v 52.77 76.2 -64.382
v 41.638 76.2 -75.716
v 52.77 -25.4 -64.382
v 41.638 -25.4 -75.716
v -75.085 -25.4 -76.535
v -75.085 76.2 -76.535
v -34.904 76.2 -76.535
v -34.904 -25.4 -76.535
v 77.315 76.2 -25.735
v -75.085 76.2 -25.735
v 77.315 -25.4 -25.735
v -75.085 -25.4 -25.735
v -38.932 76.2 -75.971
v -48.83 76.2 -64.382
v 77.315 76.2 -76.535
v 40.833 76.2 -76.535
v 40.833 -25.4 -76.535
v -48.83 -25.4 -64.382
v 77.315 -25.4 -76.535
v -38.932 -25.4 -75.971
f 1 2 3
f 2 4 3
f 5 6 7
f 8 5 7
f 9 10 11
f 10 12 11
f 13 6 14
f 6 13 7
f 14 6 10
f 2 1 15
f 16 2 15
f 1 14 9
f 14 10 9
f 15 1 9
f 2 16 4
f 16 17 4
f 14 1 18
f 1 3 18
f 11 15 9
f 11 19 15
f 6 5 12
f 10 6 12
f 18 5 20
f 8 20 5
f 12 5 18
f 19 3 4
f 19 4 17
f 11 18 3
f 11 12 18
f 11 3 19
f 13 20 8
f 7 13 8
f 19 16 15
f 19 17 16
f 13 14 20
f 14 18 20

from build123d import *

# Parameters (mm, degrees)
F0_W     = 152.4
F0_H     = 50.8
F1_DEPTH = 25.4
F4_DEPTH = 25.4
F5_DEPTH = 76.2


with BuildPart() as f1:
    # F0 (on Front) → F1 (new body)
    with BuildSketch(Plane.XZ):
        with Locations((1.1145584285, -51.1352052836)):
            Rectangle(F0_W, F0_H)
    extrude(amount=F1_DEPTH)

    # F3 (on face) → F4 (cut)
    with BuildSketch(Plane.XZ.offset(25.4)):
        Polygon((52.7703917205, -64.3824934959), (-48.8296082795, -64.3824934959), (-38.9320172776, -75.971078067), (-3.4057565499, -80.9468403459), (37.3732924352, -80.0572519513), (41.6376553476, -75.7159888744), align=None)
    extrude(amount=-F4_DEPTH, mode=Mode.SUBTRACT)

    # F5 (add): a face of the model
    f5_faces = [f1.faces().sort_by_distance(p)[0] for p in [
        (1.0289602376, 0, -47.9835586604),
    ]]
    extrude(f5_faces, amount=F5_DEPTH)


solid = f1.part
